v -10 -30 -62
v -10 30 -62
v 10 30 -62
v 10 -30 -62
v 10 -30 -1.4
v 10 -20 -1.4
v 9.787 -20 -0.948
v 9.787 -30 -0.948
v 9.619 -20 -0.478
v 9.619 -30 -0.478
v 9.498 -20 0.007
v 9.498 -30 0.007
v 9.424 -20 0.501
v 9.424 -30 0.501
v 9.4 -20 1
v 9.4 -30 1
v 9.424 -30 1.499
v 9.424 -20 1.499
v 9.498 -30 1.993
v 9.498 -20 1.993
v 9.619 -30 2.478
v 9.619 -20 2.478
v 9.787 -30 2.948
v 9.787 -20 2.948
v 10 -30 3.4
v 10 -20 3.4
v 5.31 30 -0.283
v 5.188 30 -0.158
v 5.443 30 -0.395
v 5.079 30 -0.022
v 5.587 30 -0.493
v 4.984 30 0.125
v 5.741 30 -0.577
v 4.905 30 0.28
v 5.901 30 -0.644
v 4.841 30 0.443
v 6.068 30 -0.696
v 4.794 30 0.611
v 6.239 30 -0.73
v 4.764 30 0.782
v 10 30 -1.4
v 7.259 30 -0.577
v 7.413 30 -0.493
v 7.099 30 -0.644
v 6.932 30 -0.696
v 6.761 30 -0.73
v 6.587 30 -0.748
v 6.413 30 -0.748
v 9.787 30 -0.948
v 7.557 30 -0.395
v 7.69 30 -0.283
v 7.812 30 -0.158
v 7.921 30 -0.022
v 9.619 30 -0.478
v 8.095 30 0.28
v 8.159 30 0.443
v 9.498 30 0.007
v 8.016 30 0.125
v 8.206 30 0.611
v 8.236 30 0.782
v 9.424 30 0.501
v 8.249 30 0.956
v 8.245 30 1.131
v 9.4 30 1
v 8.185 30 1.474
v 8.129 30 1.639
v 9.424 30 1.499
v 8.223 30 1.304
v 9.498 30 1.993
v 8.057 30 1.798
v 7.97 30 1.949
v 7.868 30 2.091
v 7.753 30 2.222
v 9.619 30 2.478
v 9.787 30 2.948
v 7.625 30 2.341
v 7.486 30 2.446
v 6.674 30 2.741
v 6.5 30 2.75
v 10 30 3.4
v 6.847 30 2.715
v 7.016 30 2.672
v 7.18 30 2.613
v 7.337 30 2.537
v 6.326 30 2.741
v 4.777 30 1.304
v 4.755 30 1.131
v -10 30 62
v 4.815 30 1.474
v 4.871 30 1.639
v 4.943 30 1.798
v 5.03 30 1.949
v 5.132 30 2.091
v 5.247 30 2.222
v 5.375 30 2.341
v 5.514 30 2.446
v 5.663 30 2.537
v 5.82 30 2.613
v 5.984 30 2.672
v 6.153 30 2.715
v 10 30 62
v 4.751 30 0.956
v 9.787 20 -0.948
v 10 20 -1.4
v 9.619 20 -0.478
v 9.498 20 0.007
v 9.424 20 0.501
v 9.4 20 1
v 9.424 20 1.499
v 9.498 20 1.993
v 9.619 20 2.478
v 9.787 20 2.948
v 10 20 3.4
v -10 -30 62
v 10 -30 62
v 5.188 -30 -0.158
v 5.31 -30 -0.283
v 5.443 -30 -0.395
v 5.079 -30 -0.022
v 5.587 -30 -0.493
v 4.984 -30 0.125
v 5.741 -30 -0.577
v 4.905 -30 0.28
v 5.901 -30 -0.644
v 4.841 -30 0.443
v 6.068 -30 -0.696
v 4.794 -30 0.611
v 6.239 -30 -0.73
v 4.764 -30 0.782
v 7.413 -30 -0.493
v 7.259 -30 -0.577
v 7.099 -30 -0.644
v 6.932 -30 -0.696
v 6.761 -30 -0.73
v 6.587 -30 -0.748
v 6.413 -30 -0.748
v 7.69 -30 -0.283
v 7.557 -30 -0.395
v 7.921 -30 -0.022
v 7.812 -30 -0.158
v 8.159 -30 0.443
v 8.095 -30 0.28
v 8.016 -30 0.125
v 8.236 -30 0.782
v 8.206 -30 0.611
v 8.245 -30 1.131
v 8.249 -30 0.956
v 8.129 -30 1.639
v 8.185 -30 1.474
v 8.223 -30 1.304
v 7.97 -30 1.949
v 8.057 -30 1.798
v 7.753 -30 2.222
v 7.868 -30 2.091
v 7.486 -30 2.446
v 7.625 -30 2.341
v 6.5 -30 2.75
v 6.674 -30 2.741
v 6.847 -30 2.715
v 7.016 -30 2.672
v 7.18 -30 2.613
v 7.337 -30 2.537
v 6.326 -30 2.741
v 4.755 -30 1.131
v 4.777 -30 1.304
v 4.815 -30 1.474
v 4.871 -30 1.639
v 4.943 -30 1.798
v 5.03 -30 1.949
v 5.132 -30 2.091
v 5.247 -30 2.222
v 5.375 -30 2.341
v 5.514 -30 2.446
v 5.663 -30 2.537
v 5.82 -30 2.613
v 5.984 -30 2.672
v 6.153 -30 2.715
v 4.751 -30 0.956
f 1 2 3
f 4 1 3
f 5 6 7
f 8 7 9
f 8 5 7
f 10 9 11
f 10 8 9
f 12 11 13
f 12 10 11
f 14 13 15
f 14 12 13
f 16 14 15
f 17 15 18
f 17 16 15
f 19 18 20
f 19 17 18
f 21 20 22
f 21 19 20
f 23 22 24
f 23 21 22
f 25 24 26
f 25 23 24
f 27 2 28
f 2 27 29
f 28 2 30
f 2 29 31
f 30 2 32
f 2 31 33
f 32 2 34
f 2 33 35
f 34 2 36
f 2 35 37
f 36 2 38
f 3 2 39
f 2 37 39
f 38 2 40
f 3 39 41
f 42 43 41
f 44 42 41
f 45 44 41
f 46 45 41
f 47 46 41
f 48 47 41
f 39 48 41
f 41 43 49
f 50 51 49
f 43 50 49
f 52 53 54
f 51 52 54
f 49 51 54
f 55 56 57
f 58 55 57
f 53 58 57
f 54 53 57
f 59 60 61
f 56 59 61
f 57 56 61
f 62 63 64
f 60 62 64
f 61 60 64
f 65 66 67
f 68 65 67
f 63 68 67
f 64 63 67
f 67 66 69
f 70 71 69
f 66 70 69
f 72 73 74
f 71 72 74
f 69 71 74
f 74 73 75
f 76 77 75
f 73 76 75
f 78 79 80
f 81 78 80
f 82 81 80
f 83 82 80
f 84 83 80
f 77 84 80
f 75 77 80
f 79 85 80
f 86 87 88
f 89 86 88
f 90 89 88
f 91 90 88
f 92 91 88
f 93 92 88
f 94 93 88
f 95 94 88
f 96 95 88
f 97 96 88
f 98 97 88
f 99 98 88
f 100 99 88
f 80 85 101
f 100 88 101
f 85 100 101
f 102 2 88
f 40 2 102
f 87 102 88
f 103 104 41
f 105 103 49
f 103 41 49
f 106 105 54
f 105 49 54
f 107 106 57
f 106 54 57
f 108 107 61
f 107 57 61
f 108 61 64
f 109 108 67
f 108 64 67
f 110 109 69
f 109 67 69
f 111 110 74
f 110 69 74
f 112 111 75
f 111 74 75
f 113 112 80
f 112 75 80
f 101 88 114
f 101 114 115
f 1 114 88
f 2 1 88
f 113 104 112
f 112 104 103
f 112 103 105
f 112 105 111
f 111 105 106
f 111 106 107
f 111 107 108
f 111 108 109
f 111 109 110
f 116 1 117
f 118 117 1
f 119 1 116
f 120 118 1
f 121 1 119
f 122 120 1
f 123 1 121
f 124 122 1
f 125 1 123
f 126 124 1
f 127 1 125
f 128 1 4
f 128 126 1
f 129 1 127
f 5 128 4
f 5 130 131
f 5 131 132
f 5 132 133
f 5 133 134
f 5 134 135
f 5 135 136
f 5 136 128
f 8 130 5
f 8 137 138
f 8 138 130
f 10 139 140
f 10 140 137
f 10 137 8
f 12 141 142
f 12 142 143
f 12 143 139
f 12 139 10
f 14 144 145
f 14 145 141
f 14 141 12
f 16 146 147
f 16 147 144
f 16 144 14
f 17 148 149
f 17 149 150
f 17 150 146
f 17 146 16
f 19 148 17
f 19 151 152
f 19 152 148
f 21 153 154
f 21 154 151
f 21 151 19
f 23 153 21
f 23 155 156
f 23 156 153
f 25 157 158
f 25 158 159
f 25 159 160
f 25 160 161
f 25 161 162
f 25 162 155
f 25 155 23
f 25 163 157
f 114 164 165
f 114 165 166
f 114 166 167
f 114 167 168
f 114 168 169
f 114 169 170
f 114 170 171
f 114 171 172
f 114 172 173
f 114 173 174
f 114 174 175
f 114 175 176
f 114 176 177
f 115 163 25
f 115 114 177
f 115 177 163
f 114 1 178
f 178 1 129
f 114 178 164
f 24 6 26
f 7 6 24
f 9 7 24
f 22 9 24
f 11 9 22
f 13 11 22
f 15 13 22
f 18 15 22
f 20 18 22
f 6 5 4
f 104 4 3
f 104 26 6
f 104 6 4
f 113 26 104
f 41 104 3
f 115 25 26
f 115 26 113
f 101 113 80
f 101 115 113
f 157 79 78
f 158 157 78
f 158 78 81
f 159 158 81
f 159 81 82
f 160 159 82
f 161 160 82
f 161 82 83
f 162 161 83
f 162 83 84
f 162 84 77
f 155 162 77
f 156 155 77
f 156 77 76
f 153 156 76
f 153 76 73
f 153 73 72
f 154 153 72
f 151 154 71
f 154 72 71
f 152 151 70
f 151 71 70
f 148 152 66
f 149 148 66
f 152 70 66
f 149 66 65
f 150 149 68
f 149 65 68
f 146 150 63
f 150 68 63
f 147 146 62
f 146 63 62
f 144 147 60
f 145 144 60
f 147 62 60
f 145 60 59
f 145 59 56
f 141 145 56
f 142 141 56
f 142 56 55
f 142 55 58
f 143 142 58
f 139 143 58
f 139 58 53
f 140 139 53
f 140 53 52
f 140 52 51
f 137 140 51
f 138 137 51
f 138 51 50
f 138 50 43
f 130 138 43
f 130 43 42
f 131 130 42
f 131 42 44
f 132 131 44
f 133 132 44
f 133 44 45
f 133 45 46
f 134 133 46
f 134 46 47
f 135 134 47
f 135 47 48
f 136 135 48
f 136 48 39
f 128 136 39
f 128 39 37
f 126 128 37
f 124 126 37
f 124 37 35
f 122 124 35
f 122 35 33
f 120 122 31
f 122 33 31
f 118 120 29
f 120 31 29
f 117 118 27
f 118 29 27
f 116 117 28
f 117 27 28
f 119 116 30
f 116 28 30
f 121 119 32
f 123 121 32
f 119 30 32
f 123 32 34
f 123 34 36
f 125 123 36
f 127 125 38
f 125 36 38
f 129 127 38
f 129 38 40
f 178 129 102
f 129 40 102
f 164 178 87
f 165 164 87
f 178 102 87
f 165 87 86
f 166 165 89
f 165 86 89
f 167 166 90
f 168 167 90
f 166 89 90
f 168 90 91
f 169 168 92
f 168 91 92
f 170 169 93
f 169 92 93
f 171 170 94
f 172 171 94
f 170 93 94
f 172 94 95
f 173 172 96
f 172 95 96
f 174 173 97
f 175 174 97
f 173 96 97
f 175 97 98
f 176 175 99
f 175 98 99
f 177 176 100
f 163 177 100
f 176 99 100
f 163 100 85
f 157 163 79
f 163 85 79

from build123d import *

# Parameters (mm, degrees)
SKETCH1_W           = 20
SKETCH1_H           = 60
BOSS_EXTRUDE1_DEPTH = 62
SKETCH2_R           = 5.1
CUT_EXTRUDE1_DEPTH  = 10
SKETCH3_R           = 4
SKETCH3_R_2         = 1.75
CUT_EXTRUDE2_DEPTH  = 87.856203002


with BuildPart() as part:
    # Sketch1 → Boss-Extrude1 (new, symmetric)
    with BuildSketch(Plane.XY):
        Rectangle(SKETCH1_W, SKETCH1_H)
    extrude(amount=BOSS_EXTRUDE1_DEPTH, both=True)

    # Sketch2 → Cut-Extrude1 (cut)
    with BuildSketch(Plane(origin=(0, 30, 0), x_dir=(1, 0, 0), z_dir=(0, 1, 0))):
        with Locations((14.5, -1)):
            Circle(SKETCH2_R)
    cut_extrude1 = extrude(amount=-CUT_EXTRUDE1_DEPTH, mode=Mode.SUBTRACT)

    # Mirror1: Cut-Extrude1 across plane
    add(cut_extrude1.mirror(Plane.ZX), mode=Mode.SUBTRACT)

    # Sketch3 → Cut-Extrude2 (cut, through all)
    with BuildSketch(Plane(origin=(0, 30, 0), x_dir=(1, 0, 0), z_dir=(0, 1, 0))):
        with Locations((14.5, -1)):
            Circle(SKETCH3_R)
        with Locations(Location((6.5, -1, 0), (0, 0, 270))):
            Circle(SKETCH3_R_2)
        with Locations((14.5, 7)):
            Circle(SKETCH3_R_2)
        with Locations((22.5, -1)):
            Circle(SKETCH3_R_2)
        with Locations((14.5, -9)):
            Circle(SKETCH3_R_2)
    extrude(amount=-CUT_EXTRUDE2_DEPTH, mode=Mode.SUBTRACT)


solid = part.part
